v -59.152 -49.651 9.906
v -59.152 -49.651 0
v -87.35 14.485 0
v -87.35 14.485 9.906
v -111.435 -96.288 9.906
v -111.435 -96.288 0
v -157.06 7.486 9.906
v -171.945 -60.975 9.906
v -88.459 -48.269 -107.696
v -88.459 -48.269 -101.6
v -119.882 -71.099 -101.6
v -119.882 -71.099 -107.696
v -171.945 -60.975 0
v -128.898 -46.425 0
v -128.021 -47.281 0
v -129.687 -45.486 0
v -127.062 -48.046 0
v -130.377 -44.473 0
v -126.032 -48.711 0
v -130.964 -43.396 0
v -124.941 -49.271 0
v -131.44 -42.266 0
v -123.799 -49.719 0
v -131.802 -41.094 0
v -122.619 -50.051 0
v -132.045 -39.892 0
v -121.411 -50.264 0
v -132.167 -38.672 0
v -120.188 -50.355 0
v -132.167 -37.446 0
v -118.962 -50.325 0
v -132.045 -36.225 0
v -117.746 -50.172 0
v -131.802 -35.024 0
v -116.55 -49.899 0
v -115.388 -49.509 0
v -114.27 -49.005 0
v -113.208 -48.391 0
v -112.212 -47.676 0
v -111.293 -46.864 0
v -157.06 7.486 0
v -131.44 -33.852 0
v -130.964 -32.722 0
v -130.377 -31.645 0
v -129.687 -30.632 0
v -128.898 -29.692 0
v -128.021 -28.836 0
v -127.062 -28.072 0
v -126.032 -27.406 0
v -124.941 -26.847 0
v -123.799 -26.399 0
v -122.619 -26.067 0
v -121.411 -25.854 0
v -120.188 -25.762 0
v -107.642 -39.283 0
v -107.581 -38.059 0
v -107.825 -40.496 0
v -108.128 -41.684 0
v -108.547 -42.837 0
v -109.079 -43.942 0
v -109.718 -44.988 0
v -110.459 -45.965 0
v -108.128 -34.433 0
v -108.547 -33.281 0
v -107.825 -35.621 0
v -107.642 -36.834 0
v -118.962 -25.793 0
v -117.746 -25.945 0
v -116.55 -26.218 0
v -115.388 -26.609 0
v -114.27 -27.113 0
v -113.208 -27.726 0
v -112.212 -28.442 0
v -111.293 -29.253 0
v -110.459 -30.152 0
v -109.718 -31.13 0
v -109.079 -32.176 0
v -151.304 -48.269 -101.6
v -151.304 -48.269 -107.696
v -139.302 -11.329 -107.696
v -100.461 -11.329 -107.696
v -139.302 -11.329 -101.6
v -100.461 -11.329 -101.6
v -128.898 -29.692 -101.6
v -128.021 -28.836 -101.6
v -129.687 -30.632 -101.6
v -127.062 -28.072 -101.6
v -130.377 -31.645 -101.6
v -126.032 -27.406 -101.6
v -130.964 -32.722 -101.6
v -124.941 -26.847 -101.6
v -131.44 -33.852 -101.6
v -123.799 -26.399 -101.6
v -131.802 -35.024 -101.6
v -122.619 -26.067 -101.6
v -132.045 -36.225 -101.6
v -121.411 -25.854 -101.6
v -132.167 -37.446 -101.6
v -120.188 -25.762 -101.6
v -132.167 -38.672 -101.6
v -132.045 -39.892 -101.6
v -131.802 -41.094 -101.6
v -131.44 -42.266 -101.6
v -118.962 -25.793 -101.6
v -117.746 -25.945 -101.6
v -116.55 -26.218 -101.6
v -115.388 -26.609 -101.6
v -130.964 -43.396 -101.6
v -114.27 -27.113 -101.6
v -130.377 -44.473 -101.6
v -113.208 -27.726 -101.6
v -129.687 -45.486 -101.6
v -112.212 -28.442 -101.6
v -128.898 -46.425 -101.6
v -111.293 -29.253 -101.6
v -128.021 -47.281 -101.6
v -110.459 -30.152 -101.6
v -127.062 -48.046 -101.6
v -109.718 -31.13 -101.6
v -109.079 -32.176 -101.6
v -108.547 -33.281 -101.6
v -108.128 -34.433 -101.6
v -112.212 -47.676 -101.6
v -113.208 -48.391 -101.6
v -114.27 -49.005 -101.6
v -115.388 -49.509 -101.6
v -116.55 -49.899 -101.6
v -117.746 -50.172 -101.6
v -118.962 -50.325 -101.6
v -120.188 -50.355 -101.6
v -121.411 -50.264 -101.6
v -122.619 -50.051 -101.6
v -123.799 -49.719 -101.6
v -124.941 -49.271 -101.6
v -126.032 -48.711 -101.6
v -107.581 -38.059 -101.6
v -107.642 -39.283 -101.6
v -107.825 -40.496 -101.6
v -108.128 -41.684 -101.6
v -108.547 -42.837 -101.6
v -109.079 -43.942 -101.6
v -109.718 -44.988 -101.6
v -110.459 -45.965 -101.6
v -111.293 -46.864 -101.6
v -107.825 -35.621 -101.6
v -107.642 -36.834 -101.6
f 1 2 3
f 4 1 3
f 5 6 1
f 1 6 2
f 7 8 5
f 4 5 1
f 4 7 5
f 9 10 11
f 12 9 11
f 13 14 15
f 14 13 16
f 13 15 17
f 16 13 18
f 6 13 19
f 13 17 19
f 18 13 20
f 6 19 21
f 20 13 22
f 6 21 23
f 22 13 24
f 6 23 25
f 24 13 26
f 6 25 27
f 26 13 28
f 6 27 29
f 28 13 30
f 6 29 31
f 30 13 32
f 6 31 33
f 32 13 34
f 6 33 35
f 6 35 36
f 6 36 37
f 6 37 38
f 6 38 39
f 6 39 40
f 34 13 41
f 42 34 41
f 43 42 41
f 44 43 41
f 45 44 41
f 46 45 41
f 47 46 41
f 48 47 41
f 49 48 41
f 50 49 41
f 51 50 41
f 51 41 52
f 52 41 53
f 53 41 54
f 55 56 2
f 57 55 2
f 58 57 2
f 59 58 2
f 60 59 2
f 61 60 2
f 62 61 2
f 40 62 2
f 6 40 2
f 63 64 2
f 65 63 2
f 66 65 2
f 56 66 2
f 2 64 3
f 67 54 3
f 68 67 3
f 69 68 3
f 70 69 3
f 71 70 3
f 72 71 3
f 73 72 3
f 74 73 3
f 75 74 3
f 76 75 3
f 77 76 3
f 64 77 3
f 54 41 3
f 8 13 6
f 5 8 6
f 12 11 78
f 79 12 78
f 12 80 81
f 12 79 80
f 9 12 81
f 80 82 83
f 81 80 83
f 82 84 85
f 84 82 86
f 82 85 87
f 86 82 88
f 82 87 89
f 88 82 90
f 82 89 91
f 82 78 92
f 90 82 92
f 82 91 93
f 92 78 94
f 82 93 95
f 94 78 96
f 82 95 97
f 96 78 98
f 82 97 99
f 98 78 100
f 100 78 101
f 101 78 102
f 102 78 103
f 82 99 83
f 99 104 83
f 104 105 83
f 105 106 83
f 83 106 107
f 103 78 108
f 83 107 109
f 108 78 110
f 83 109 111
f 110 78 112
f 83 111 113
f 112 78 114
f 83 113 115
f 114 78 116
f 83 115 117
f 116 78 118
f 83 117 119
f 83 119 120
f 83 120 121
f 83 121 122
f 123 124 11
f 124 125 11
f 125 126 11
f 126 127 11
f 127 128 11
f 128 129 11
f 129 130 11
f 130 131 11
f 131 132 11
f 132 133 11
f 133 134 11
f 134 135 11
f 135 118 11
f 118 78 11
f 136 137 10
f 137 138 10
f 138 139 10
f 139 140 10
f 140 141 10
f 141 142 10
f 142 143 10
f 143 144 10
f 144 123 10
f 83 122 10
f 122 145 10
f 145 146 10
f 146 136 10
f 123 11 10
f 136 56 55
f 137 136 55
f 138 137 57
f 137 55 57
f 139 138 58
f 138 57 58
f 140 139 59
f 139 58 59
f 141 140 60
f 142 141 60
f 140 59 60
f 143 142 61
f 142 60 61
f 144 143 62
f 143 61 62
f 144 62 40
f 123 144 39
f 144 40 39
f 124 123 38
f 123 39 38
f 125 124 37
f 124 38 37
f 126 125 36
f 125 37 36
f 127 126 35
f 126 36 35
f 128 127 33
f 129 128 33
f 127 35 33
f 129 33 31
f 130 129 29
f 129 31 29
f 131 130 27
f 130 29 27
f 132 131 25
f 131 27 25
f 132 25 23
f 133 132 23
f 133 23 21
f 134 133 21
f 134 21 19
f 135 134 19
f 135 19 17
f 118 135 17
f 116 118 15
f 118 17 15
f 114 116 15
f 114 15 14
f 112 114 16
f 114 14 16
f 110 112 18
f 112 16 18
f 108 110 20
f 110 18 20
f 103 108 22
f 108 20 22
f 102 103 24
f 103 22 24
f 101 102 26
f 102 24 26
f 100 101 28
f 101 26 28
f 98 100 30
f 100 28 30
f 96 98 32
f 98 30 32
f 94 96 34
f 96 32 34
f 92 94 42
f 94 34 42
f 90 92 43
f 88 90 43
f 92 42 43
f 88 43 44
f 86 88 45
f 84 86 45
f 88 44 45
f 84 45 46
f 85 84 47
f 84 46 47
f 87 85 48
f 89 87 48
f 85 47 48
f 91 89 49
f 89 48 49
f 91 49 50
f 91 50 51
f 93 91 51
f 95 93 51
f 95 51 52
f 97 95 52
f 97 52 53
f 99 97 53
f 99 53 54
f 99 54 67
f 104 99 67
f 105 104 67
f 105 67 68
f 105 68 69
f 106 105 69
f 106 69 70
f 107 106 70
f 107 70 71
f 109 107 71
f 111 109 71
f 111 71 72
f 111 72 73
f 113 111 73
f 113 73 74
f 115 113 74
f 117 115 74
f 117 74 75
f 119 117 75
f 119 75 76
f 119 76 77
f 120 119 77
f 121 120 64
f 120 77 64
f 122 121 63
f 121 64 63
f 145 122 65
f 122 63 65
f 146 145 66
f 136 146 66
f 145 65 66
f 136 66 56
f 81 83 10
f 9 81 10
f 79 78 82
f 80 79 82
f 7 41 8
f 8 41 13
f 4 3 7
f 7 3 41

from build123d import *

# Parameters (mm, degrees)
F1_DEPTH = 9.906
F2_R     = 12.300458
F3_DEPTH = 101.6
F5_DEPTH = 6.096


with BuildPart() as f1:
    # F0 (on Top) → F1 (new body)
    with BuildSketch(Plane.XY):
        Polygon((-87.349732, 14.484886), (-157.059993, 7.486077), (-171.945385, -60.975071), (-111.434803, -96.287578), (-59.151814, -49.65076), align=None)
    extrude(amount=F1_DEPTH)

    # F2 (on face) → F3 (join)
    with BuildSketch(Plane(origin=(0, 0, 0), x_dir=(1, 0, 0), z_dir=(0, 0, -1))):
        with Locations((-119.881563, 38.058758)):
            Circle(F2_R)
    extrude(amount=F3_DEPTH)

    # F4 (on face) → F5 (join)
    with BuildSketch(Plane(origin=(0, 0, -101.6), x_dir=(1, 0, 0), z_dir=(0, 0, -1))):
        Polygon((-139.301867, 11.329003), (-100.461259, 11.329003), (-88.458851, 48.268616), (-119.881563, 71.098552), (-151.304275, 48.268616), align=None)
    extrude(amount=F5_DEPTH)


solid = f1.part
